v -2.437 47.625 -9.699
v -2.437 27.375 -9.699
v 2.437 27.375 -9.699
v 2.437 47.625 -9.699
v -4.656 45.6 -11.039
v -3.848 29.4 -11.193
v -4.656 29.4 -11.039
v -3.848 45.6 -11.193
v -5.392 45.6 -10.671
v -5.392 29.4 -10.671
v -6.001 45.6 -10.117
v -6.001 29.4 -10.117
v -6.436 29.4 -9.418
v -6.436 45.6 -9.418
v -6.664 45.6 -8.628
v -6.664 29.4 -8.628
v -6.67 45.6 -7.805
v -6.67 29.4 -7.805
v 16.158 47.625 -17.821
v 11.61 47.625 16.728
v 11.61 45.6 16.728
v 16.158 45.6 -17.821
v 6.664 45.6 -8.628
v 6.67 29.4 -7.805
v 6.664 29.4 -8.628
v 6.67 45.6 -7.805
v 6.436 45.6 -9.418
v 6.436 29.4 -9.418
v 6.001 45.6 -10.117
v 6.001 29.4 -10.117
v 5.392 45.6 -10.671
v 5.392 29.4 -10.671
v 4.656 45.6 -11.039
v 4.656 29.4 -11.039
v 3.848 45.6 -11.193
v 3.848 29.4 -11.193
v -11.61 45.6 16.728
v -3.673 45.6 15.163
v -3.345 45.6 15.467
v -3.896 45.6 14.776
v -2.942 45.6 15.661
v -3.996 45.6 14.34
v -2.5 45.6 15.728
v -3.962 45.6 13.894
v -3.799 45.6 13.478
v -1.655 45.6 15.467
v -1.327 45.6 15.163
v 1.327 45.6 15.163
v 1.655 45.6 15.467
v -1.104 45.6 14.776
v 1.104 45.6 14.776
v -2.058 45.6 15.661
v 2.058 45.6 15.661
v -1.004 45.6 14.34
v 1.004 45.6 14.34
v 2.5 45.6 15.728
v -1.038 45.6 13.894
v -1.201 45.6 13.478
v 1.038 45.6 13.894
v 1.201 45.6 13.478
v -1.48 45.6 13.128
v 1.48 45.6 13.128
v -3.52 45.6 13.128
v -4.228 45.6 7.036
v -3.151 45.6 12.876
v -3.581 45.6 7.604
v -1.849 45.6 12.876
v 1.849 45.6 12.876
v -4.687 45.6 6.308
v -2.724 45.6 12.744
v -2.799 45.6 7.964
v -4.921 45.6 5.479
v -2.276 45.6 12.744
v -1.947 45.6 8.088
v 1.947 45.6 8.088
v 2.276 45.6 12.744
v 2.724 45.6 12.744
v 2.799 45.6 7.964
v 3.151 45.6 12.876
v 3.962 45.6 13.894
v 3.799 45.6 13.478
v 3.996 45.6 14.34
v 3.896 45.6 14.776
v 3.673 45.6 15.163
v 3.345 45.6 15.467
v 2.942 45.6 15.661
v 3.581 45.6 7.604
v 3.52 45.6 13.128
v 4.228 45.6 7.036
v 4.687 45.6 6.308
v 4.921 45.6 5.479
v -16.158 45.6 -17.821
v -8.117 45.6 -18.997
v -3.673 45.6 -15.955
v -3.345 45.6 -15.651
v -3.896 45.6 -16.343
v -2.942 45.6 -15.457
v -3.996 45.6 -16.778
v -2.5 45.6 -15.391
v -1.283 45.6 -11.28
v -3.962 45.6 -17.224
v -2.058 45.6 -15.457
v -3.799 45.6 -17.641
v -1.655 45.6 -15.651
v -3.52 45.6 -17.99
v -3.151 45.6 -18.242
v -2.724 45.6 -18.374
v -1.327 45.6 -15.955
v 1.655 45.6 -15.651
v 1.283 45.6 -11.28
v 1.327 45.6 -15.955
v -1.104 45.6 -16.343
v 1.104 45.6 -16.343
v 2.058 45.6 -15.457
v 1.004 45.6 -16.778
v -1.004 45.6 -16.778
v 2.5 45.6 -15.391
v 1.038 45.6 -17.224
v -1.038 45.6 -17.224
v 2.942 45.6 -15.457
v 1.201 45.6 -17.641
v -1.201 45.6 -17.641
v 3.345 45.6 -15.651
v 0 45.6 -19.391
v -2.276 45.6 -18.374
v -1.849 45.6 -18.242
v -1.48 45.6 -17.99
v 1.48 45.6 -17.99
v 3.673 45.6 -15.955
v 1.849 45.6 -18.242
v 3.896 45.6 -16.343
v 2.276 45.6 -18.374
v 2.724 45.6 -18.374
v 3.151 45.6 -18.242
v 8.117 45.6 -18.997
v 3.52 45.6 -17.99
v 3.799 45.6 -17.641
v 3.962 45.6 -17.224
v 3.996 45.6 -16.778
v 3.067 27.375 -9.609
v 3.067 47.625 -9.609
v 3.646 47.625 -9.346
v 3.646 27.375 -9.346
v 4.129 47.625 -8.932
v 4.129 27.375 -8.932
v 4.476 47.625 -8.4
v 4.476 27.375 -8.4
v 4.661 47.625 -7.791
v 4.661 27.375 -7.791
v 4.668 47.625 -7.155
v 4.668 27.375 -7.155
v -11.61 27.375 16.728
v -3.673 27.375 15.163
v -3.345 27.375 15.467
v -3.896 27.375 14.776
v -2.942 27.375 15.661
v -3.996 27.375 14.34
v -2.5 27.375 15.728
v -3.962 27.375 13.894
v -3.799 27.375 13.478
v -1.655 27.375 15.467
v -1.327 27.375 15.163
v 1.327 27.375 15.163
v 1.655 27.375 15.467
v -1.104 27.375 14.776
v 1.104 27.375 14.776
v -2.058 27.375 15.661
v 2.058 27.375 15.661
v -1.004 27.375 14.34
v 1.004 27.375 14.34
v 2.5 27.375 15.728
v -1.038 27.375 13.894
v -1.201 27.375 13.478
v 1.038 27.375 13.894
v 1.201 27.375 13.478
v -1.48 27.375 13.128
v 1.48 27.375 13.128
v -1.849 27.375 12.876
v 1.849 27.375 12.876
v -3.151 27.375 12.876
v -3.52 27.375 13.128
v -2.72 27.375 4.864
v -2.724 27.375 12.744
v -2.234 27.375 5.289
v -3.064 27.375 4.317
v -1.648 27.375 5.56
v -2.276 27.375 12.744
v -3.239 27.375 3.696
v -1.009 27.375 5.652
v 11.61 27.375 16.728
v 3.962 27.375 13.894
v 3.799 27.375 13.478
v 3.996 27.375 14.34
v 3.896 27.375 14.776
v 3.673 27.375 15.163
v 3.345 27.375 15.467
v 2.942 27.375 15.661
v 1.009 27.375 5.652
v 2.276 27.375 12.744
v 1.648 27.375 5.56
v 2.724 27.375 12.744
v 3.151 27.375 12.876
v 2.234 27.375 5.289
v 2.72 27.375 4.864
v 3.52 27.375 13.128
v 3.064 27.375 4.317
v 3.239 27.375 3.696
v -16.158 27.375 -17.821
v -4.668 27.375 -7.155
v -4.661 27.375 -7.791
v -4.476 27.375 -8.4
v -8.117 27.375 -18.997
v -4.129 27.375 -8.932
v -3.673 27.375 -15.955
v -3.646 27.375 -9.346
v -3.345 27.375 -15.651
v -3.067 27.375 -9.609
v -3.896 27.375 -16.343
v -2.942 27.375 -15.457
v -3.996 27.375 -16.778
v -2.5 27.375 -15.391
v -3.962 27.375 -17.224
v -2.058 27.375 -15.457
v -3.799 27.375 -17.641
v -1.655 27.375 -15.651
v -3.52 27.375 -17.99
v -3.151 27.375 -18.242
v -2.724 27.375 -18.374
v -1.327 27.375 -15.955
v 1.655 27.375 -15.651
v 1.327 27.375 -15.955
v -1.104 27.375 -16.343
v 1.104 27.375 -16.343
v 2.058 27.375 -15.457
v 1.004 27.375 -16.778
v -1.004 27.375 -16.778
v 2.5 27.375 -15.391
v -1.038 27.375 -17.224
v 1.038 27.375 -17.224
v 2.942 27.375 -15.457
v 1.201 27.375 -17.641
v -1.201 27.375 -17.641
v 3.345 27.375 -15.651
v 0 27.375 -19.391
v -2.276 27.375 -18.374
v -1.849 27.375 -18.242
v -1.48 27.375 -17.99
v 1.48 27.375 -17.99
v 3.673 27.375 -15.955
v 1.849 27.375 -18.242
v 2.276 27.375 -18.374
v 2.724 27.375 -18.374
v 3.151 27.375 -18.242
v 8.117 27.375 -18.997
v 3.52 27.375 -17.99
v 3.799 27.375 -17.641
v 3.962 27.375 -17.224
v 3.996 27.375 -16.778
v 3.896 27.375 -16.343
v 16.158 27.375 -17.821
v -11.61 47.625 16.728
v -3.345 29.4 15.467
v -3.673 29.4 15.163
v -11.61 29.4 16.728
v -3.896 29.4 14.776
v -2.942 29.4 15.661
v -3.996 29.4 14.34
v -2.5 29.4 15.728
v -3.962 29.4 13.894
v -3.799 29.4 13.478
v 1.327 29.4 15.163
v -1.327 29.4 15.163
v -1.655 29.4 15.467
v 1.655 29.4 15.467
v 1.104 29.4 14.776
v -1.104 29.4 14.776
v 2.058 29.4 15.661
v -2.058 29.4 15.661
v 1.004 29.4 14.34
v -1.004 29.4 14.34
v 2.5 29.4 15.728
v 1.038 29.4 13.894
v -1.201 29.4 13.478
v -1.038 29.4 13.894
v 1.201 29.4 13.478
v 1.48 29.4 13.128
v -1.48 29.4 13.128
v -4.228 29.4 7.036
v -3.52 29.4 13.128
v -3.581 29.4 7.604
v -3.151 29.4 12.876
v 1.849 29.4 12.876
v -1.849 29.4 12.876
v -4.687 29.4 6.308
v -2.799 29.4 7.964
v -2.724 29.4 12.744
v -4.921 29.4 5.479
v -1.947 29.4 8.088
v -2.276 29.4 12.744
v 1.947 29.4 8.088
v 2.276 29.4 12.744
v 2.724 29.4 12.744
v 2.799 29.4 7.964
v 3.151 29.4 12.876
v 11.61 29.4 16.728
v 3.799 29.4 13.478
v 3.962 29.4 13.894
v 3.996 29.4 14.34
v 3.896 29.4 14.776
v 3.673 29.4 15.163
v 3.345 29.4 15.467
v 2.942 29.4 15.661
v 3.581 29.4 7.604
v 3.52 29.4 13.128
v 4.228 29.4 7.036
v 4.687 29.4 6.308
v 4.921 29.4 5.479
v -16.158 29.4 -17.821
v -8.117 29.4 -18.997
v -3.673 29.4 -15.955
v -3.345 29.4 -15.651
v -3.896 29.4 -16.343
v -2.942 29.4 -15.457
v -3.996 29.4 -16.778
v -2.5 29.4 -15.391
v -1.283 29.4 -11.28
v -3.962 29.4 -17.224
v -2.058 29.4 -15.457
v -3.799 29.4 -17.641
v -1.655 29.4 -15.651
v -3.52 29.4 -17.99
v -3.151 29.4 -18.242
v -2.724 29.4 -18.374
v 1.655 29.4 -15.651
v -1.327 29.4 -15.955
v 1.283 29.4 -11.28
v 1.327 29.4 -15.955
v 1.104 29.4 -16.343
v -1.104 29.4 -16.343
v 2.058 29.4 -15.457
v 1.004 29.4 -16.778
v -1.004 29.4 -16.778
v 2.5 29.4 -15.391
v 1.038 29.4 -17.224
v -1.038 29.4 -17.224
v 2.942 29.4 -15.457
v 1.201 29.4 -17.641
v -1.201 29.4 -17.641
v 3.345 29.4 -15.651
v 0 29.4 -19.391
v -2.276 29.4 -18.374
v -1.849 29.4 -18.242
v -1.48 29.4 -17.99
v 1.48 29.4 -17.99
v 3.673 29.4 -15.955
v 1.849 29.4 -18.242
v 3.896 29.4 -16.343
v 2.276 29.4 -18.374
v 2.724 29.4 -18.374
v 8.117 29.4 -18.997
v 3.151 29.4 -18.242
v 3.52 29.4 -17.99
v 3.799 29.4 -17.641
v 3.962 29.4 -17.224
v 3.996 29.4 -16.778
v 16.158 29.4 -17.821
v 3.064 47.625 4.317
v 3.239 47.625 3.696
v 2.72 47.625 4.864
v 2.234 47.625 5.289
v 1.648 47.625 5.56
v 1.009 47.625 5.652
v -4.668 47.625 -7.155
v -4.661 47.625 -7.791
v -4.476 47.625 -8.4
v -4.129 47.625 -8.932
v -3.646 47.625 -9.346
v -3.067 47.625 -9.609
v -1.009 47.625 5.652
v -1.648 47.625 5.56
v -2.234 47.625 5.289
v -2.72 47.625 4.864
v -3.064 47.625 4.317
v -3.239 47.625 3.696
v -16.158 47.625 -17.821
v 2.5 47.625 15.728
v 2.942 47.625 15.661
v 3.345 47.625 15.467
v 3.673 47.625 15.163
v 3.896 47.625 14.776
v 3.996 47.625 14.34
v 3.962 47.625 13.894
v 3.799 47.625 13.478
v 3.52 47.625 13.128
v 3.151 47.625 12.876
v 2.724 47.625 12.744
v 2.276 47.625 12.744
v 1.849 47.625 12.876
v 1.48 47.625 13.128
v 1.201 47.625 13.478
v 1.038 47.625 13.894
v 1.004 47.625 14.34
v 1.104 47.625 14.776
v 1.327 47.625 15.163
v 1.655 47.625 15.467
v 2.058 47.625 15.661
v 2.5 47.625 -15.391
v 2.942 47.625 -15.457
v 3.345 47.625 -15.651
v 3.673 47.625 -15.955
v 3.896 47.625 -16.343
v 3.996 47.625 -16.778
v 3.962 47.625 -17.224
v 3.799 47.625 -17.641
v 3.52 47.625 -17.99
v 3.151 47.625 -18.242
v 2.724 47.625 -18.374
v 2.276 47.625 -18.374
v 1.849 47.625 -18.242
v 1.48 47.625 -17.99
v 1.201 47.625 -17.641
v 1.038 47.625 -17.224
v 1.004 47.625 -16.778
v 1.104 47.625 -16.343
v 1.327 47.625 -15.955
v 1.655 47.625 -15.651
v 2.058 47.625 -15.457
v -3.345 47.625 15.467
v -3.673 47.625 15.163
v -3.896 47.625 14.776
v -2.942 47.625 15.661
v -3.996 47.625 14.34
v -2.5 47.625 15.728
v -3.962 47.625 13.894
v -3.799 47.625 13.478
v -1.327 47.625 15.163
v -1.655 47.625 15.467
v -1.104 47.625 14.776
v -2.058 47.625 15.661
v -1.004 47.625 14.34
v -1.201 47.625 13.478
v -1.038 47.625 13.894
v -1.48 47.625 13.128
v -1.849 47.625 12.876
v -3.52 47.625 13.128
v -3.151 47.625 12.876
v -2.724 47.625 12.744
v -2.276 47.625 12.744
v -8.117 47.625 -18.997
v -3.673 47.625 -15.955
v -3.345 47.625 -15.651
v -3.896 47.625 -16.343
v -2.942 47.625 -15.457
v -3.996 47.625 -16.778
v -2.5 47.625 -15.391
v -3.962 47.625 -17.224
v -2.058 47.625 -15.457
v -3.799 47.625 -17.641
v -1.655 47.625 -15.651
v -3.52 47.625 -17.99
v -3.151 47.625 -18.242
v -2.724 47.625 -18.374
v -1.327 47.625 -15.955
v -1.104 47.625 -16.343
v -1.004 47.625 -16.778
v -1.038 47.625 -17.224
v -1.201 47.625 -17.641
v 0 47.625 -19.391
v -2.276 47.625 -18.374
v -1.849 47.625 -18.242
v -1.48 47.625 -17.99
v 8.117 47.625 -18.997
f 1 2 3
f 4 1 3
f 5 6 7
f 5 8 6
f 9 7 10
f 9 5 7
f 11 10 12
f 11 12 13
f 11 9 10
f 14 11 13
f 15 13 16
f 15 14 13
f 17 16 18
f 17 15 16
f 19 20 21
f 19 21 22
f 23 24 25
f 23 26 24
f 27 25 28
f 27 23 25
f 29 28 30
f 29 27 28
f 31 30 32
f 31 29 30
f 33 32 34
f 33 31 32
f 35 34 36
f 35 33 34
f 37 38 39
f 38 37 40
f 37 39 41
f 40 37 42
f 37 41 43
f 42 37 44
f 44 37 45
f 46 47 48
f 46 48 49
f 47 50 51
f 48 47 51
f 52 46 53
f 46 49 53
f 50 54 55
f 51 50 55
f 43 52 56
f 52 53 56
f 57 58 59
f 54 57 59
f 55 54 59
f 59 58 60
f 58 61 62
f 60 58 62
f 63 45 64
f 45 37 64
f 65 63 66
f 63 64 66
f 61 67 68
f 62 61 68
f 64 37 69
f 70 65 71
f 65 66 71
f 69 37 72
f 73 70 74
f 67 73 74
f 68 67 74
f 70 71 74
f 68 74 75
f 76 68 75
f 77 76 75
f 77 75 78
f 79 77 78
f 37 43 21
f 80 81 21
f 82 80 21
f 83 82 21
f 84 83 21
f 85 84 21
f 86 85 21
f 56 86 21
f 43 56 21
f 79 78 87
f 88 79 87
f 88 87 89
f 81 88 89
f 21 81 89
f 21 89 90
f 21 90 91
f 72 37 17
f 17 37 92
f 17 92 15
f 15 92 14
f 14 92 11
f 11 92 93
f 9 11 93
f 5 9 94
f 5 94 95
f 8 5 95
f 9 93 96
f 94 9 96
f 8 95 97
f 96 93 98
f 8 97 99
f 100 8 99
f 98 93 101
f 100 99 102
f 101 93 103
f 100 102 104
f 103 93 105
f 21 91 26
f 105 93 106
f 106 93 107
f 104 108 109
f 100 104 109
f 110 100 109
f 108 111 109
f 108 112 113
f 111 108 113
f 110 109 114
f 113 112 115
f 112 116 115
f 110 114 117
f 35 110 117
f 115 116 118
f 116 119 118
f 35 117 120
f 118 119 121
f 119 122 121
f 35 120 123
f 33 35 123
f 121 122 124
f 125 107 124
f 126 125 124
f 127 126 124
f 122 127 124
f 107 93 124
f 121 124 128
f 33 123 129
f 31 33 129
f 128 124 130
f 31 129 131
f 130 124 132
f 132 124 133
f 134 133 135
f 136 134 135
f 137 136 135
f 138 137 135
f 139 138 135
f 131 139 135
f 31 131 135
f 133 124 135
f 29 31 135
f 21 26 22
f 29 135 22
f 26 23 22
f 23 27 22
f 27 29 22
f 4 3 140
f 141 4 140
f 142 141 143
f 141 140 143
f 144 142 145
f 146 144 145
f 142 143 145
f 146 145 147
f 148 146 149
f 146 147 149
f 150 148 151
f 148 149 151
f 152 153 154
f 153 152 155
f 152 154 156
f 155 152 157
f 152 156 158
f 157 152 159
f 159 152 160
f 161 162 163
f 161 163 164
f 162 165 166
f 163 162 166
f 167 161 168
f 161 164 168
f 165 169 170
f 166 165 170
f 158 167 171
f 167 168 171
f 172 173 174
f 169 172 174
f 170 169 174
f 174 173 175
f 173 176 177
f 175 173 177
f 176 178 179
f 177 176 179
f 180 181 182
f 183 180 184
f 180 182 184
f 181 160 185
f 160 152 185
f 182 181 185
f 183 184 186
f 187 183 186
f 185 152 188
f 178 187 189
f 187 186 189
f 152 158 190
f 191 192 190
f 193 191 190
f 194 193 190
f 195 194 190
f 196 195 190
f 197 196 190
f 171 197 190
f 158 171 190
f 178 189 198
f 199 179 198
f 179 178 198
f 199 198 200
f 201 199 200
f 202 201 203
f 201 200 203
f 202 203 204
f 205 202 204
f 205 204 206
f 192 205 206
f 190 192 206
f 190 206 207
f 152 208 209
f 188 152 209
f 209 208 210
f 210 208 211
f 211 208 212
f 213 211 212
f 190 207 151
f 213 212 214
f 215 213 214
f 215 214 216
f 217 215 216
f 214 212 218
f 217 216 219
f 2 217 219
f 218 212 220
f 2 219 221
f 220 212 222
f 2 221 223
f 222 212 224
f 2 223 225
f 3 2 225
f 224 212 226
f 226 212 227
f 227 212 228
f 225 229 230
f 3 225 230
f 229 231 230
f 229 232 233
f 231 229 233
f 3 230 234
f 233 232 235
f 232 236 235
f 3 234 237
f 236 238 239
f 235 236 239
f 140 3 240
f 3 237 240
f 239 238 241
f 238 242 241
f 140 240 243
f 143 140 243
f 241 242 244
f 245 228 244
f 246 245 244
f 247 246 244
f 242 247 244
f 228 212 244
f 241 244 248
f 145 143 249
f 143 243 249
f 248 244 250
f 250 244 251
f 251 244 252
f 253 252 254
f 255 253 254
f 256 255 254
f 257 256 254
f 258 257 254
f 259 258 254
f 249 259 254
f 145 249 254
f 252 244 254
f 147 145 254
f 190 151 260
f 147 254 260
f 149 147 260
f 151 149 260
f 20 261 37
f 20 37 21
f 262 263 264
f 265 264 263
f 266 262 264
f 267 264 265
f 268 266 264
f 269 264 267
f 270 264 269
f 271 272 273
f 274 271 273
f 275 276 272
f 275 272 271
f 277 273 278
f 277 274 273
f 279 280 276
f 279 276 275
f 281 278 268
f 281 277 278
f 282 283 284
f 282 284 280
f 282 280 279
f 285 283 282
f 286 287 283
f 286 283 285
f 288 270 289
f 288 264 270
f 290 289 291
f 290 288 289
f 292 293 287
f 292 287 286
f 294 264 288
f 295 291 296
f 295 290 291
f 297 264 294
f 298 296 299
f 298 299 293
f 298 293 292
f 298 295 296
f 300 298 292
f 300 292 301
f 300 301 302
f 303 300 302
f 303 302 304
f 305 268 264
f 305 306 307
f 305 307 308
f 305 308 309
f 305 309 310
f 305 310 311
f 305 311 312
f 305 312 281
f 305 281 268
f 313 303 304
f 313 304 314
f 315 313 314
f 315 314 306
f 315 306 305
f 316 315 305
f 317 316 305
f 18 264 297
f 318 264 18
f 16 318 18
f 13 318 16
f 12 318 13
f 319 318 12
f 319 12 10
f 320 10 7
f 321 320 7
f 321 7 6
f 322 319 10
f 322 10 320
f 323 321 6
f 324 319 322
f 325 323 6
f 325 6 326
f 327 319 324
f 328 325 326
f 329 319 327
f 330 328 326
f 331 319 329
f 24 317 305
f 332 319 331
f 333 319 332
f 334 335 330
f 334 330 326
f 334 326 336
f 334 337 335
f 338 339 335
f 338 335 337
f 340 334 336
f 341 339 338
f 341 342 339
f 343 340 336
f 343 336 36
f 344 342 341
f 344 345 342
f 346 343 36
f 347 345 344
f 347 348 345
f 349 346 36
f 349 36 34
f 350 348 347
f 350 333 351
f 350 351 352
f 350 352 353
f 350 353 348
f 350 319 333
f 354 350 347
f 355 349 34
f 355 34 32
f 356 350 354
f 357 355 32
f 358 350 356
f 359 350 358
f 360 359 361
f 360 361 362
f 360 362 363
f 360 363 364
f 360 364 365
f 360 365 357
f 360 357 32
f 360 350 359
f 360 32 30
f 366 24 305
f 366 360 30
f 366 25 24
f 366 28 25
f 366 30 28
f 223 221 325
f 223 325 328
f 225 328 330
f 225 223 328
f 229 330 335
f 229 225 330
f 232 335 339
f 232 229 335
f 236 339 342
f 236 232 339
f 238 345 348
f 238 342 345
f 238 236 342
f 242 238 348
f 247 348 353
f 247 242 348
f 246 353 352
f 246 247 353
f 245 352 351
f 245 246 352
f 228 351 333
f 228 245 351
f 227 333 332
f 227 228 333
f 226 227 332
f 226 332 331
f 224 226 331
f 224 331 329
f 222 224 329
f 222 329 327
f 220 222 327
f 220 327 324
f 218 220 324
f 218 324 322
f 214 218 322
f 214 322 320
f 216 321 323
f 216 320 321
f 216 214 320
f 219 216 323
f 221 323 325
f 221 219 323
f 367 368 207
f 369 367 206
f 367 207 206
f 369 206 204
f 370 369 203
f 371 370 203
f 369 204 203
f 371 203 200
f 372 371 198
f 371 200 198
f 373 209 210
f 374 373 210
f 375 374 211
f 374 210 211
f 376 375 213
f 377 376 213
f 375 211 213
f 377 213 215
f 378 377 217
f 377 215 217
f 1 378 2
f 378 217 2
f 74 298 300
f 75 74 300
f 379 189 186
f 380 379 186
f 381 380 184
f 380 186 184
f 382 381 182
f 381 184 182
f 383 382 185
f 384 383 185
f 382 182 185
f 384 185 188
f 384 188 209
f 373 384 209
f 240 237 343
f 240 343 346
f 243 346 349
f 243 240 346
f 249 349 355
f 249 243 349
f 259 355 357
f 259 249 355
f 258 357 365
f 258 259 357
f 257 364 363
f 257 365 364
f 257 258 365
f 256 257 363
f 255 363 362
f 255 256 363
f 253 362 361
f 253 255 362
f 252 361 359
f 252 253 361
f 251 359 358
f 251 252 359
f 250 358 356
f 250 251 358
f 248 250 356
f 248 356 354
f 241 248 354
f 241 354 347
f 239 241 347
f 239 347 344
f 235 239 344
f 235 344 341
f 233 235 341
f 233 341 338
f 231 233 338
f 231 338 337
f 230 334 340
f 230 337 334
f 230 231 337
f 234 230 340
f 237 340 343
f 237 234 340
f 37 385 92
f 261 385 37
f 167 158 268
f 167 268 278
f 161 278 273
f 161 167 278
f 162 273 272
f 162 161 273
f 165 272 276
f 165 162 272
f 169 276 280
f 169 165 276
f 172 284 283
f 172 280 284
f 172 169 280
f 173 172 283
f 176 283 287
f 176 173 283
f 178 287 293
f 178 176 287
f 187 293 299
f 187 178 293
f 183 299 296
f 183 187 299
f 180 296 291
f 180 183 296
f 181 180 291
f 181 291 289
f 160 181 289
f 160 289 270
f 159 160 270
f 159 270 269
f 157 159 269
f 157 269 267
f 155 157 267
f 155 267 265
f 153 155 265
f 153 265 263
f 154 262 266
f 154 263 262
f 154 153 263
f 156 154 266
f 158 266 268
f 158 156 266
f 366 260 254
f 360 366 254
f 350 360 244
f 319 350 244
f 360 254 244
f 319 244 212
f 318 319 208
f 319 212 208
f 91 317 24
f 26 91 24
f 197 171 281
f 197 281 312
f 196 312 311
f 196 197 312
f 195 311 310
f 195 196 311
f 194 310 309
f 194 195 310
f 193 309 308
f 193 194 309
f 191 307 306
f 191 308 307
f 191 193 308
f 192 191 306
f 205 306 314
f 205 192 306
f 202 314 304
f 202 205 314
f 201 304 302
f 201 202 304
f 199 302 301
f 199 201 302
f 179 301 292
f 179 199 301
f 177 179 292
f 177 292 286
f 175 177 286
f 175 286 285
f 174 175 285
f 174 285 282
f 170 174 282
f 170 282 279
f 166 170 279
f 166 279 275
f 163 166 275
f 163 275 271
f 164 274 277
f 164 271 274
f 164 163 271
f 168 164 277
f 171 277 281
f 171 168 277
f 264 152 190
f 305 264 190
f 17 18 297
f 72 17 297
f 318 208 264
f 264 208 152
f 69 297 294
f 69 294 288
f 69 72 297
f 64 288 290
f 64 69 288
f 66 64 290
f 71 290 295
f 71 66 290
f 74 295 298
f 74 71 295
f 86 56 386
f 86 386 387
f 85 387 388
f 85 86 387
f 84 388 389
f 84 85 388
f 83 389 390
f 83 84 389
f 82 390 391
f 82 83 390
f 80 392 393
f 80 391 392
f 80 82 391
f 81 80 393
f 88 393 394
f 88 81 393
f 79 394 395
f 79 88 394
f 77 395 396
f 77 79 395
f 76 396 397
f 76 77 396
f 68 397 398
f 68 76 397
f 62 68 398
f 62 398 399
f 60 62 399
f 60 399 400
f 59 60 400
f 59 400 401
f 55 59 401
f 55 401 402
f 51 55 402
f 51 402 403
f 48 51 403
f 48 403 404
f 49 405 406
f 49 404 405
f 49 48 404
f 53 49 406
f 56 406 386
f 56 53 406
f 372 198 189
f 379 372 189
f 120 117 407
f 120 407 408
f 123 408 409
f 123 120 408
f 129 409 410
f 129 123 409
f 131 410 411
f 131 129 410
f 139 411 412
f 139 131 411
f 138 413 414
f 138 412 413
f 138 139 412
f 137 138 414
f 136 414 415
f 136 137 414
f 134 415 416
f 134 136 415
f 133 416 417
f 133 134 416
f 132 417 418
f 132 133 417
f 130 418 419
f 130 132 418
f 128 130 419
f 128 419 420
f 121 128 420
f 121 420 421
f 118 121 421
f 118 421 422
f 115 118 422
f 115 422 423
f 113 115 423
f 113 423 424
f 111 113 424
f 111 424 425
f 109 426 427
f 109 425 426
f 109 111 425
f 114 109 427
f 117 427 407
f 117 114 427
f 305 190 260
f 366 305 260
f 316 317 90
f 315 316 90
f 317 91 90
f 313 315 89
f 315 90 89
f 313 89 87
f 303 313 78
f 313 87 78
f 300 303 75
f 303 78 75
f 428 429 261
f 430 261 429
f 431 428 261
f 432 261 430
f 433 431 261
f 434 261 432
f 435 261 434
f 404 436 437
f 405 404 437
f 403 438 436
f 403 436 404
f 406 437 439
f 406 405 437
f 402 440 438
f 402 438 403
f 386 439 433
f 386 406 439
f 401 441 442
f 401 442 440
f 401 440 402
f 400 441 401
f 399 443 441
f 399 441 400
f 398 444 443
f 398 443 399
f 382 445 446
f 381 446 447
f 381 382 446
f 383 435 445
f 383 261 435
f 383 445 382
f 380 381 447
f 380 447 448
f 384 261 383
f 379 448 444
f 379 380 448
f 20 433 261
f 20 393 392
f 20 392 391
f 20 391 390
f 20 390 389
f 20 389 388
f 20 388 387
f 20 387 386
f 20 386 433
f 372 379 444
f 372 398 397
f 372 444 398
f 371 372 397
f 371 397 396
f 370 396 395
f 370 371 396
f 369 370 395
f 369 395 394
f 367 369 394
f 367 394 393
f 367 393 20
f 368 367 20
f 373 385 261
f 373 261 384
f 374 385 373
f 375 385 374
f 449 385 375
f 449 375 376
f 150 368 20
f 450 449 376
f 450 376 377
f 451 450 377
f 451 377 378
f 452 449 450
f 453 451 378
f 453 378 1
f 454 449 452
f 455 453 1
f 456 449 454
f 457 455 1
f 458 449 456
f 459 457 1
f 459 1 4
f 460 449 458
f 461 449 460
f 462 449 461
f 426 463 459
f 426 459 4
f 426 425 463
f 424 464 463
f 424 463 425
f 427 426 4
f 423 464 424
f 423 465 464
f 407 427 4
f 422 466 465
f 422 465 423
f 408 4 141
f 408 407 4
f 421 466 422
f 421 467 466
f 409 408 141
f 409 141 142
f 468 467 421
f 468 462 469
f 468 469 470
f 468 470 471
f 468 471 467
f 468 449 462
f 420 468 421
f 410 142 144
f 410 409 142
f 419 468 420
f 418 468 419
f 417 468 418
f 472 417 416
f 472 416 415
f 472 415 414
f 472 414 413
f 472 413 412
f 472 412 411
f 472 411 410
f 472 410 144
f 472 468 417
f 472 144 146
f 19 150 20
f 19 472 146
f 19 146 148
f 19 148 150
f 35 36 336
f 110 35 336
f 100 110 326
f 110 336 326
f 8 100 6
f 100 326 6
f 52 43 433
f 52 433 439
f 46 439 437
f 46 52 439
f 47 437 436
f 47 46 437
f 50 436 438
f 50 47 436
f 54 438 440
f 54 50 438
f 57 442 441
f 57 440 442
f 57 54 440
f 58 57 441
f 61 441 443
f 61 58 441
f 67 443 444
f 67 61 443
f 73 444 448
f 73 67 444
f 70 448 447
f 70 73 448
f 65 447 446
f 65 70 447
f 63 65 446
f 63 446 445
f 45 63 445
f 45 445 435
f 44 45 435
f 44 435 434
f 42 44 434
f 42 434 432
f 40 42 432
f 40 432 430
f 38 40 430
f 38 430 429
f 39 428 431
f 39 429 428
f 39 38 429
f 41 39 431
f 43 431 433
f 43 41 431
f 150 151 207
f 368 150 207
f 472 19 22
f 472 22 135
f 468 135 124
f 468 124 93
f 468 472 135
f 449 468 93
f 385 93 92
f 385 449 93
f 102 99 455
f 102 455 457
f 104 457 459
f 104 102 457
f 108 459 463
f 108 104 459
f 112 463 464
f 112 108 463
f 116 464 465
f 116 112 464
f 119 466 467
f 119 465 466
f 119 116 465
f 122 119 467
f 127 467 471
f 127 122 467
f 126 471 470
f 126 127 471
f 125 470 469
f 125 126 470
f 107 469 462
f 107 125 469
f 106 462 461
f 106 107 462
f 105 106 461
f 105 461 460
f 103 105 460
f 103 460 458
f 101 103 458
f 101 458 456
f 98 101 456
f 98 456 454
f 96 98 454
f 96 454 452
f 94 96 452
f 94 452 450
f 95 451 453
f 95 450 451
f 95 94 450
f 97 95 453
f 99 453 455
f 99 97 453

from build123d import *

# Parameters (mm, degrees)
BOSS_EXTRUDE1_DEPTH     = 7.5
BOSS_EXTRUDE2_DEPTH     = 60
SCALE1_SCALE            = 0.27
FILLET1_R               = 3
CUT_EXTRUDE1_DEPTH      = 33.359704853
CUT_EXTRUDE1_DEPTH_BACK = 33.359704853
SKETCH3_R               = 1.5


with BuildPart() as part:
    # Sketch1 → Boss-Extrude1 (new body)
    with BuildSketch(Plane(origin=(0, 0, 0), x_dir=(1, 0, 0), z_dir=(0, 1, 0))):
        with BuildLine():
            Line((-59.846085345, 60.187558837), (-43, -67.771163202))
            Line((-43, -67.771163202), (43, -67.771163202))
            Line((43, -67.771163202), (59.846085345, 60.187558837))
            ThreePointArc((59.846085345, 60.187558837), (0, 66), (-59.846085345, 60.187558837))
        make_face()
    boss_extrude1 = extrude(amount=BOSS_EXTRUDE1_DEPTH)

    # Sketch2 → Boss-Extrude2 (add)
    with BuildSketch(Plane(origin=(0, 7.5, 0), x_dir=(1, 0, 0), z_dir=(0, 1, 0))):
        with BuildLine():
            Line((16.954011105, -35.771163202), (26.24120117, 34.772048928))
            ThreePointArc((26.24120117, 34.772048928), (0, 36), (-26.24120117, 34.772048928))
            Line((-26.24120117, 34.772048928), (-16.954011105, -35.771163202))
            Line((-16.954011105, -35.771163202), (16.954011105, -35.771163202))
        make_face()
    extrude(amount=BOSS_EXTRUDE2_DEPTH)

    # Mirror1: Boss-Extrude1 across plane
    add(boss_extrude1.mirror(Plane.ZX.offset(37.5)))


with BuildPart() as part_1:
    # Scale1: scaled about (0, 37.5, -2.151413181)
    add(part.part.scale(SCALE1_SCALE).moved(Location((0, 27.375, -1.570531622))))

    # Fillet1
    fillet1_edges = [part_1.edges().sort_by_distance(p)[0] for p in [
        (4.577582998, 37.5, 8.087682442),
        (7.085124316, 37.5, -10.958984833),
        (-7.085124316, 37.5, -10.958984833),
        (-4.577582998, 37.5, 8.087682442),
    ]]
    fillet(fillet1_edges, radius=FILLET1_R)

    # Sketch3 → Cut-Extrude1 (cut, two sides: drawn at the far end of the back side and taken through both)
    with BuildSketch(Plane(origin=(0, 47.625, 0), x_dir=(1, 0, 0), z_dir=(0, 1, 0)).offset(-CUT_EXTRUDE1_DEPTH_BACK)):
        with BuildLine():
            ThreePointArc((3.239363531, -3.696003073), (2.492140677, -5.093958707), (1.008612593, -5.65231697))
            Line((1.008612593, -5.65231697), (-1.008612593, -5.65231697))
            ThreePointArc((-1.008612593, -5.65231697), (-2.492140855, -5.093956631), (-3.239363817, -3.696000902))
            Line((-3.239363817, -3.696000902), (-4.667928785, 7.155027331))
            ThreePointArc((-4.667928785, 7.155027331), (-4.128817414, 8.932239348), (-2.437177847, 9.698711264))
            Line((-2.437177847, 9.698711264), (2.437177847, 9.698711264))
            ThreePointArc((2.437177847, 9.698711264), (4.128817414, 8.932239348), (4.667928785, 7.155027331))
            Line((4.667928785, 7.155027331), (3.239363531, -3.696003073))
        make_face()
        with Locations(Location((2.5, 16.890531622, 0), (0, 0, 270))):
            Circle(SKETCH3_R)
        with Locations(Location((-2.5, 16.890531622, 0), (0, 0, 270))):
            Circle(SKETCH3_R)
        with Locations(Location((-2.5, -14.227682443, 0), (0, 0, 270))):
            Circle(SKETCH3_R)
        with Locations(Location((2.5, -14.227682443, 0), (0, 0, 270))):
            Circle(SKETCH3_R)
    extrude(amount=CUT_EXTRUDE1_DEPTH + CUT_EXTRUDE1_DEPTH_BACK, mode=Mode.SUBTRACT)


solid = part_1.part
